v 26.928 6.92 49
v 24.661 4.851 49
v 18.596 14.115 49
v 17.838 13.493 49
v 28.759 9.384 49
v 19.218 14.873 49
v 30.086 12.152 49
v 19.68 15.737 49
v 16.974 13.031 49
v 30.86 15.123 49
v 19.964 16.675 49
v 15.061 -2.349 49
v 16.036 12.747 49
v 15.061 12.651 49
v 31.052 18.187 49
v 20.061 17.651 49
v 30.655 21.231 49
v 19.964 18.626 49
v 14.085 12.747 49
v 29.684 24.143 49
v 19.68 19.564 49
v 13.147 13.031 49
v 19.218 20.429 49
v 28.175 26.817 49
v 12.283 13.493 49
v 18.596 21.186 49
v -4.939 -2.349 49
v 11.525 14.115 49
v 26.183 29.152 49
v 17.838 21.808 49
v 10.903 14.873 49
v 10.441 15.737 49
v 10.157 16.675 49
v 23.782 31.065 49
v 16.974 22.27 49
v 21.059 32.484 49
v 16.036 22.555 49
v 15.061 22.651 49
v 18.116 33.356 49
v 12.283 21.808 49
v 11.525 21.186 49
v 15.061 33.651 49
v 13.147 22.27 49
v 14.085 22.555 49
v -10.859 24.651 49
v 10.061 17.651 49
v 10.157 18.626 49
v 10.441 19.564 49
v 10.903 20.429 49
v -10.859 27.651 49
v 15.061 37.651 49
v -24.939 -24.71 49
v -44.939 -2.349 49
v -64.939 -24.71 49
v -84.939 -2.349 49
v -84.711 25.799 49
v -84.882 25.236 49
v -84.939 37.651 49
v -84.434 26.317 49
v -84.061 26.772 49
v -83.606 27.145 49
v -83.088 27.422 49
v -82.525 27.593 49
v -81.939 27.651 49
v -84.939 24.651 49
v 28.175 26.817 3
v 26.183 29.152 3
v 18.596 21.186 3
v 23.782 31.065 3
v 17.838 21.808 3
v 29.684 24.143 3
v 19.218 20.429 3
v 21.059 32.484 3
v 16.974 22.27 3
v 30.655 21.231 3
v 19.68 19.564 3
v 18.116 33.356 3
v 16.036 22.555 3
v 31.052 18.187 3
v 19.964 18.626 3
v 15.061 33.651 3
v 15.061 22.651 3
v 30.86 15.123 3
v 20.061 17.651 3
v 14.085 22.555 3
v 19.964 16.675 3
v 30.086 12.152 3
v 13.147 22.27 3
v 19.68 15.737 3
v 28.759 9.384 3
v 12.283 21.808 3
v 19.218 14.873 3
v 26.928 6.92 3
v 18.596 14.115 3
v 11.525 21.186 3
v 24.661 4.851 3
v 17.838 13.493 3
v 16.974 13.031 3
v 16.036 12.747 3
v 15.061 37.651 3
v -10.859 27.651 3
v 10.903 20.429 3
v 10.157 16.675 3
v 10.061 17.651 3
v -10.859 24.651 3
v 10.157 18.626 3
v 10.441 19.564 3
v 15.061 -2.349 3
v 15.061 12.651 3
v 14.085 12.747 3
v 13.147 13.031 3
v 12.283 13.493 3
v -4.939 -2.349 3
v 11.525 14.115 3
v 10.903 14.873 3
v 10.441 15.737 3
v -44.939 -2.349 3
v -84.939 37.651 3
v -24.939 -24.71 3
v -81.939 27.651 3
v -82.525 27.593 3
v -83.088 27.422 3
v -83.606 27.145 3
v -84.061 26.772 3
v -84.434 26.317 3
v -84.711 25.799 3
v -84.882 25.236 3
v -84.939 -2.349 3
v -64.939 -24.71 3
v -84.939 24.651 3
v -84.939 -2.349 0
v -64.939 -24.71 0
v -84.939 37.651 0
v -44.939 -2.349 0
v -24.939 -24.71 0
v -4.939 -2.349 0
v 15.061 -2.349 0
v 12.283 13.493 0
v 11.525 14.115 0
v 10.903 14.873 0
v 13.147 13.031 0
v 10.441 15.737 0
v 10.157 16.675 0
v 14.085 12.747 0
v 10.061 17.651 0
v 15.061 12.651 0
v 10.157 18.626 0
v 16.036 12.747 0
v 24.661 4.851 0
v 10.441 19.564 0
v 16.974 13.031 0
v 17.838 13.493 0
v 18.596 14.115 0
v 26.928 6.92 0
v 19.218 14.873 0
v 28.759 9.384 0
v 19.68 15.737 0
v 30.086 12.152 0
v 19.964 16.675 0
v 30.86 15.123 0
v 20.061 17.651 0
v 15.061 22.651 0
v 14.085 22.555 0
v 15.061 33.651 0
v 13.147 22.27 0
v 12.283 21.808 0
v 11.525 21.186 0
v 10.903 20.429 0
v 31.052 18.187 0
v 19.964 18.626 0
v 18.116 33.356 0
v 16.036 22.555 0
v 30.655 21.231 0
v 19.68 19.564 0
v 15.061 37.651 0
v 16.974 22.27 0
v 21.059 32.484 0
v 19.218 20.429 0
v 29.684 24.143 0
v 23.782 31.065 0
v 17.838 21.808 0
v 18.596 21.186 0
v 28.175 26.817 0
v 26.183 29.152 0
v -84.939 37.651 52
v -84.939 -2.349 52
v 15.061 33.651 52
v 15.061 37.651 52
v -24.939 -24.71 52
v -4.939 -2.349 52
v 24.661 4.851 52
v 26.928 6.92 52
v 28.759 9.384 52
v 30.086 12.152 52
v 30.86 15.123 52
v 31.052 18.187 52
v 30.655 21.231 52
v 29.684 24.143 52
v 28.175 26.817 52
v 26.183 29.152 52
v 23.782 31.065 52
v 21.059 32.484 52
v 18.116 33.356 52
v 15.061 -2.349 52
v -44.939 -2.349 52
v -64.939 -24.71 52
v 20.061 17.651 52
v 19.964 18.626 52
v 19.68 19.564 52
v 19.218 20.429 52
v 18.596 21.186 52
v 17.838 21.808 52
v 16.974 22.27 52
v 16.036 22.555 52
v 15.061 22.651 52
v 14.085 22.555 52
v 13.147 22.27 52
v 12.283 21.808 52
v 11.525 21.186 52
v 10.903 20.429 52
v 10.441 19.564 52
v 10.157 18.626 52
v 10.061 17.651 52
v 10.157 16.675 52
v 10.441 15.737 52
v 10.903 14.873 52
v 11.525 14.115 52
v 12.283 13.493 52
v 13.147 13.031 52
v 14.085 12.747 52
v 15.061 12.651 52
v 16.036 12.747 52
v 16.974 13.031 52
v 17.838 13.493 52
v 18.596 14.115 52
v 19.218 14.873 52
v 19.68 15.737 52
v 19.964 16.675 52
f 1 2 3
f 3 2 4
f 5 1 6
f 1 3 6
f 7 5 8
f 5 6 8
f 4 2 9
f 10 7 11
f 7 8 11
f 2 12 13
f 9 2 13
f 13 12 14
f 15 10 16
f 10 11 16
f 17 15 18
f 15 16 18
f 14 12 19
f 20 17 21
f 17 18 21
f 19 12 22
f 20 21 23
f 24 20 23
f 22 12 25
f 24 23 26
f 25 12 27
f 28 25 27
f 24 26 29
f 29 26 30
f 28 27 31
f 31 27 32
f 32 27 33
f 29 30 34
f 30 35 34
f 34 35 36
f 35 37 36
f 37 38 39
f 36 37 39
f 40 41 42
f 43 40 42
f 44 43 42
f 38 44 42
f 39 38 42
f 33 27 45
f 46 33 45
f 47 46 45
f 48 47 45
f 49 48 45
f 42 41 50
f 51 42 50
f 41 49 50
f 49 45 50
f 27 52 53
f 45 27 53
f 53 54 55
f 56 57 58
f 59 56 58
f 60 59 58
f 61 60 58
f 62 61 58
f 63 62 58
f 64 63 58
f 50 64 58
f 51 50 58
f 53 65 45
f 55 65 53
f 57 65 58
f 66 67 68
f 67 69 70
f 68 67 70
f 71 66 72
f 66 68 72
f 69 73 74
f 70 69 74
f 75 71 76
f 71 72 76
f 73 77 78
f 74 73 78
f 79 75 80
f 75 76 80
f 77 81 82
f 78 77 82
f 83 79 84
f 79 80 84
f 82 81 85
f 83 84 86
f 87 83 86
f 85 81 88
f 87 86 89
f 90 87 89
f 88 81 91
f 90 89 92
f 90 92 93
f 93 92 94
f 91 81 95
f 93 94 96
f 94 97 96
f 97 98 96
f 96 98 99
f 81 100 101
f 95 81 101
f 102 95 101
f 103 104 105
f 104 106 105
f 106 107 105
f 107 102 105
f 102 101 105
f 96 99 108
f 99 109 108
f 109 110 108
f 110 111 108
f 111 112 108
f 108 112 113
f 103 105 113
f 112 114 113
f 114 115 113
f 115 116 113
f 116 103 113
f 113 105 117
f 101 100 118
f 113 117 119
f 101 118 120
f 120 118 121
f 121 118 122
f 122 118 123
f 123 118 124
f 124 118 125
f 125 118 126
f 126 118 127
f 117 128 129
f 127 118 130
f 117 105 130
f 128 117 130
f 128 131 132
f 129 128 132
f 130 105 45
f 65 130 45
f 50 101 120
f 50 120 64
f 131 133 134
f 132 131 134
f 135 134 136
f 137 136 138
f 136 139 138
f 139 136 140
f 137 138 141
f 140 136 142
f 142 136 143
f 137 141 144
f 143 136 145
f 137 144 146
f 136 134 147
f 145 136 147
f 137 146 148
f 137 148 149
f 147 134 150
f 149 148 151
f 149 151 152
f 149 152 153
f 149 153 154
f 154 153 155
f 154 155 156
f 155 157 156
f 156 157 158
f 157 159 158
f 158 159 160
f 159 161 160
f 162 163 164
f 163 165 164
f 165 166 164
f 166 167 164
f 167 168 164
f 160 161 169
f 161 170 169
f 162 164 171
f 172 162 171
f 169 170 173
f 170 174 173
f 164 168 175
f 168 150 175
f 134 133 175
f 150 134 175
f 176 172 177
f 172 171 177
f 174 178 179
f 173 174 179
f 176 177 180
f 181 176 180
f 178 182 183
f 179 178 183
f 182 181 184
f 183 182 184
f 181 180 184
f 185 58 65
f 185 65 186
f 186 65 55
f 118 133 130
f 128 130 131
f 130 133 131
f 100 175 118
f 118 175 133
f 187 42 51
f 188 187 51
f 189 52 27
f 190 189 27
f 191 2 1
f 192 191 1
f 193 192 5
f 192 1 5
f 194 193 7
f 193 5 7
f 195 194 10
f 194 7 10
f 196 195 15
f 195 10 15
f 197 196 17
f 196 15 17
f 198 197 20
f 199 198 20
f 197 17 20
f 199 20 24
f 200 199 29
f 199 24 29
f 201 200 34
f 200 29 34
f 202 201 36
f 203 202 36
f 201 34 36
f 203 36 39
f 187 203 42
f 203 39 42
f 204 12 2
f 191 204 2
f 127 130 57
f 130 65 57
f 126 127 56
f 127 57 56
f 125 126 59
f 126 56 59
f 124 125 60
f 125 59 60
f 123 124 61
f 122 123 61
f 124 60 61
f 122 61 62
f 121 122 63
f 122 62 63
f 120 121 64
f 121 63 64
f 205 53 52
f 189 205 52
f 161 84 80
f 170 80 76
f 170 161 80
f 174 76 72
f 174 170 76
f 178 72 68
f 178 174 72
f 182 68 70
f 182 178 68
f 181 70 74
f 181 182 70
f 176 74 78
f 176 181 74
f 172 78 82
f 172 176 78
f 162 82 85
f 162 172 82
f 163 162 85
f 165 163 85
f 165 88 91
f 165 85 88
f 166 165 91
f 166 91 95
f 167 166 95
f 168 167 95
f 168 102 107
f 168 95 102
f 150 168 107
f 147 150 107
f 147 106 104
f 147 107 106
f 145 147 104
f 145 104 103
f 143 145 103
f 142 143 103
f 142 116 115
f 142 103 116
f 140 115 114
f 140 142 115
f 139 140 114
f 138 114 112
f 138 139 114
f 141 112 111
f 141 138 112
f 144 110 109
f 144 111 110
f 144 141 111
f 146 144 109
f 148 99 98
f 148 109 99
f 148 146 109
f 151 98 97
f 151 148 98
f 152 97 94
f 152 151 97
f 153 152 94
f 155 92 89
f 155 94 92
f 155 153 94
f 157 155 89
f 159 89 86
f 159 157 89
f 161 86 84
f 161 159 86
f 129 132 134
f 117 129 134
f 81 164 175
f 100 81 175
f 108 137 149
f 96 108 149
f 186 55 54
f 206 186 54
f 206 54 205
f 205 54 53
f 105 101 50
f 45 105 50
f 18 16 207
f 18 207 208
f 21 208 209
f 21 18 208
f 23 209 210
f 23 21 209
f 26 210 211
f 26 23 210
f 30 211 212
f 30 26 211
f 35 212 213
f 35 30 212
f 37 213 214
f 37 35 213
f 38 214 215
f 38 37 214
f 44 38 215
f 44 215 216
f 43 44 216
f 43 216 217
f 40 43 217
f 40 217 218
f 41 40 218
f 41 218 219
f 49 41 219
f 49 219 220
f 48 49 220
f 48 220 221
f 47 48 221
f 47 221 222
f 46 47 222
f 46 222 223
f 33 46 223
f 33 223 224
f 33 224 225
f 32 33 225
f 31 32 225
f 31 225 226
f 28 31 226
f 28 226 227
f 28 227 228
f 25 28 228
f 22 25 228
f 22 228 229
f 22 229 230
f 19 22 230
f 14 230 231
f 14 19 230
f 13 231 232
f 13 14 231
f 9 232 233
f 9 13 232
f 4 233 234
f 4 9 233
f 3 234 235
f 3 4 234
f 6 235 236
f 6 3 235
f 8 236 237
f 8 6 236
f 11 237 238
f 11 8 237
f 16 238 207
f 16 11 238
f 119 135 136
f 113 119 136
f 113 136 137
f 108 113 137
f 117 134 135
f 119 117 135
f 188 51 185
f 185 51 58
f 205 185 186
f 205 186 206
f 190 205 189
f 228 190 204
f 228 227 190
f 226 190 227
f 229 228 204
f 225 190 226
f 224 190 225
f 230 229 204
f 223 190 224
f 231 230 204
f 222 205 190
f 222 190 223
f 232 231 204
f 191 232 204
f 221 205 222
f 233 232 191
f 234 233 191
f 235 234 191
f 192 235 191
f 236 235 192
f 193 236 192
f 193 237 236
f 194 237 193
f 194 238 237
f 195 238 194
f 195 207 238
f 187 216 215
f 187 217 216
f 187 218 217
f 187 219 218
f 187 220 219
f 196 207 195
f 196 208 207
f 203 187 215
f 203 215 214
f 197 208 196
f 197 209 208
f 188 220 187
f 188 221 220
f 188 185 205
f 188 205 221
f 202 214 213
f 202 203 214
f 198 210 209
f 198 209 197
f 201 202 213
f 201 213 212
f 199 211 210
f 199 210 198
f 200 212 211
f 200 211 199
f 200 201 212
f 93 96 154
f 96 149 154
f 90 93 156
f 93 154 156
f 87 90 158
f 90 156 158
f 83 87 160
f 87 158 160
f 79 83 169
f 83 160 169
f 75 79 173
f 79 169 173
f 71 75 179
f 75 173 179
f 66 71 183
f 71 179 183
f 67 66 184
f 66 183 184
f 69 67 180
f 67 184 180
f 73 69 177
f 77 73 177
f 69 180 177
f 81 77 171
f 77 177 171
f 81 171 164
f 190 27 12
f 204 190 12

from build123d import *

# Parameters (mm, degrees)
F0_R     = 5
F1_DEPTH = 52
F2_W     = 31.6232873572
F2_H     = 46
F2_W_2   = 27
F2_W_3   = 8.3583824264
F2_W_4   = 10
F3_DEPTH = 116.001
F4_R     = 2.99999
F5_W     = 50
F5_H     = 46
F6_DEPTH = 52.361679775


# Not quite as in the source:
# - a fillet or chamfer is up to 0.001 mm smaller than in the source, because OpenCascade refuses the exact size


with BuildPart() as f1:
    # F0 (on Top) → F1 (new body)
    with BuildSketch(Plane.XY):
        with BuildLine():
            Line((15.0605264698, 33.6507520748), (15.0605264698, 37.6507520748))
            Line((15.0605264698, 37.6507520748), (-84.9394735302, 37.6507520748))
            Line((-84.9394735302, 37.6507520748), (-84.9394735302, -2.3492479252))
            Line((-84.9394735302, -2.3492479252), (-64.9394735302, -24.7099277002))
            Line((-64.9394735302, -24.7099277002), (-44.9394735302, -2.3492479252))
            Line((-44.9394735302, -2.3492479252), (-24.9394735302, -24.7099277002))
            Line((-24.9394735302, -24.7099277002), (-4.9394735302, -2.3492479252))
            Line((-4.9394735302, -2.3492479252), (15.0605264698, -2.3492479252))
            Line((15.0605264698, -2.3492479252), (24.6605264698, 4.8507520748))
            ThreePointArc((24.6605264698, 4.8507520748), (30.2394592386, 22.7103963311), (15.0605264698, 33.6507520748))
        make_face()
        with Locations((15.0605264698, 17.6507520748)):
            Circle(F0_R, mode=Mode.SUBTRACT)
    extrude(amount=F1_DEPTH)

    # F2 (on face) → F3 (cut, through all)
    with BuildSketch(Plane(origin=(-84.9394735302, 0, 0), x_dir=(0, -1, 0), z_dir=(-1, 0, 0))):
        with Locations((18.1608916038, 26)):
            Rectangle(F2_W, F2_H)
        with Locations((-11.1507520748, 26)):
            Rectangle(F2_W_2, F2_H)
        with Locations((-41.829943288, 26)):
            Rectangle(F2_W_3, F2_H)
        with Locations((-32.6507520748, 26)):
            Rectangle(F2_W_4, F2_H)
    extrude(amount=-F3_DEPTH, mode=Mode.SUBTRACT)

    # F4 (radius 3 in the source; OpenCascade refuses exactly that, so slightly less here)
    f4_edges = [f1.edges().sort_by_distance(p)[0] for p in [
        (27.550522, 27.650752, 26),
        (-84.939474, 27.650752, 26),
    ]]
    fillet(f4_edges, radius=F4_R)

    # F5 (on face) → F6 (cut, through all)
    with BuildSketch(Plane(origin=(0, 27.6507520748, 0), x_dir=(-1, 0, 0), z_dir=(0, 1, 0))):
        with Locations((-14.1408709809, 26)):
            Rectangle(F5_W, F5_H)
    extrude(amount=-F6_DEPTH, mode=Mode.SUBTRACT)


solid = f1.part
